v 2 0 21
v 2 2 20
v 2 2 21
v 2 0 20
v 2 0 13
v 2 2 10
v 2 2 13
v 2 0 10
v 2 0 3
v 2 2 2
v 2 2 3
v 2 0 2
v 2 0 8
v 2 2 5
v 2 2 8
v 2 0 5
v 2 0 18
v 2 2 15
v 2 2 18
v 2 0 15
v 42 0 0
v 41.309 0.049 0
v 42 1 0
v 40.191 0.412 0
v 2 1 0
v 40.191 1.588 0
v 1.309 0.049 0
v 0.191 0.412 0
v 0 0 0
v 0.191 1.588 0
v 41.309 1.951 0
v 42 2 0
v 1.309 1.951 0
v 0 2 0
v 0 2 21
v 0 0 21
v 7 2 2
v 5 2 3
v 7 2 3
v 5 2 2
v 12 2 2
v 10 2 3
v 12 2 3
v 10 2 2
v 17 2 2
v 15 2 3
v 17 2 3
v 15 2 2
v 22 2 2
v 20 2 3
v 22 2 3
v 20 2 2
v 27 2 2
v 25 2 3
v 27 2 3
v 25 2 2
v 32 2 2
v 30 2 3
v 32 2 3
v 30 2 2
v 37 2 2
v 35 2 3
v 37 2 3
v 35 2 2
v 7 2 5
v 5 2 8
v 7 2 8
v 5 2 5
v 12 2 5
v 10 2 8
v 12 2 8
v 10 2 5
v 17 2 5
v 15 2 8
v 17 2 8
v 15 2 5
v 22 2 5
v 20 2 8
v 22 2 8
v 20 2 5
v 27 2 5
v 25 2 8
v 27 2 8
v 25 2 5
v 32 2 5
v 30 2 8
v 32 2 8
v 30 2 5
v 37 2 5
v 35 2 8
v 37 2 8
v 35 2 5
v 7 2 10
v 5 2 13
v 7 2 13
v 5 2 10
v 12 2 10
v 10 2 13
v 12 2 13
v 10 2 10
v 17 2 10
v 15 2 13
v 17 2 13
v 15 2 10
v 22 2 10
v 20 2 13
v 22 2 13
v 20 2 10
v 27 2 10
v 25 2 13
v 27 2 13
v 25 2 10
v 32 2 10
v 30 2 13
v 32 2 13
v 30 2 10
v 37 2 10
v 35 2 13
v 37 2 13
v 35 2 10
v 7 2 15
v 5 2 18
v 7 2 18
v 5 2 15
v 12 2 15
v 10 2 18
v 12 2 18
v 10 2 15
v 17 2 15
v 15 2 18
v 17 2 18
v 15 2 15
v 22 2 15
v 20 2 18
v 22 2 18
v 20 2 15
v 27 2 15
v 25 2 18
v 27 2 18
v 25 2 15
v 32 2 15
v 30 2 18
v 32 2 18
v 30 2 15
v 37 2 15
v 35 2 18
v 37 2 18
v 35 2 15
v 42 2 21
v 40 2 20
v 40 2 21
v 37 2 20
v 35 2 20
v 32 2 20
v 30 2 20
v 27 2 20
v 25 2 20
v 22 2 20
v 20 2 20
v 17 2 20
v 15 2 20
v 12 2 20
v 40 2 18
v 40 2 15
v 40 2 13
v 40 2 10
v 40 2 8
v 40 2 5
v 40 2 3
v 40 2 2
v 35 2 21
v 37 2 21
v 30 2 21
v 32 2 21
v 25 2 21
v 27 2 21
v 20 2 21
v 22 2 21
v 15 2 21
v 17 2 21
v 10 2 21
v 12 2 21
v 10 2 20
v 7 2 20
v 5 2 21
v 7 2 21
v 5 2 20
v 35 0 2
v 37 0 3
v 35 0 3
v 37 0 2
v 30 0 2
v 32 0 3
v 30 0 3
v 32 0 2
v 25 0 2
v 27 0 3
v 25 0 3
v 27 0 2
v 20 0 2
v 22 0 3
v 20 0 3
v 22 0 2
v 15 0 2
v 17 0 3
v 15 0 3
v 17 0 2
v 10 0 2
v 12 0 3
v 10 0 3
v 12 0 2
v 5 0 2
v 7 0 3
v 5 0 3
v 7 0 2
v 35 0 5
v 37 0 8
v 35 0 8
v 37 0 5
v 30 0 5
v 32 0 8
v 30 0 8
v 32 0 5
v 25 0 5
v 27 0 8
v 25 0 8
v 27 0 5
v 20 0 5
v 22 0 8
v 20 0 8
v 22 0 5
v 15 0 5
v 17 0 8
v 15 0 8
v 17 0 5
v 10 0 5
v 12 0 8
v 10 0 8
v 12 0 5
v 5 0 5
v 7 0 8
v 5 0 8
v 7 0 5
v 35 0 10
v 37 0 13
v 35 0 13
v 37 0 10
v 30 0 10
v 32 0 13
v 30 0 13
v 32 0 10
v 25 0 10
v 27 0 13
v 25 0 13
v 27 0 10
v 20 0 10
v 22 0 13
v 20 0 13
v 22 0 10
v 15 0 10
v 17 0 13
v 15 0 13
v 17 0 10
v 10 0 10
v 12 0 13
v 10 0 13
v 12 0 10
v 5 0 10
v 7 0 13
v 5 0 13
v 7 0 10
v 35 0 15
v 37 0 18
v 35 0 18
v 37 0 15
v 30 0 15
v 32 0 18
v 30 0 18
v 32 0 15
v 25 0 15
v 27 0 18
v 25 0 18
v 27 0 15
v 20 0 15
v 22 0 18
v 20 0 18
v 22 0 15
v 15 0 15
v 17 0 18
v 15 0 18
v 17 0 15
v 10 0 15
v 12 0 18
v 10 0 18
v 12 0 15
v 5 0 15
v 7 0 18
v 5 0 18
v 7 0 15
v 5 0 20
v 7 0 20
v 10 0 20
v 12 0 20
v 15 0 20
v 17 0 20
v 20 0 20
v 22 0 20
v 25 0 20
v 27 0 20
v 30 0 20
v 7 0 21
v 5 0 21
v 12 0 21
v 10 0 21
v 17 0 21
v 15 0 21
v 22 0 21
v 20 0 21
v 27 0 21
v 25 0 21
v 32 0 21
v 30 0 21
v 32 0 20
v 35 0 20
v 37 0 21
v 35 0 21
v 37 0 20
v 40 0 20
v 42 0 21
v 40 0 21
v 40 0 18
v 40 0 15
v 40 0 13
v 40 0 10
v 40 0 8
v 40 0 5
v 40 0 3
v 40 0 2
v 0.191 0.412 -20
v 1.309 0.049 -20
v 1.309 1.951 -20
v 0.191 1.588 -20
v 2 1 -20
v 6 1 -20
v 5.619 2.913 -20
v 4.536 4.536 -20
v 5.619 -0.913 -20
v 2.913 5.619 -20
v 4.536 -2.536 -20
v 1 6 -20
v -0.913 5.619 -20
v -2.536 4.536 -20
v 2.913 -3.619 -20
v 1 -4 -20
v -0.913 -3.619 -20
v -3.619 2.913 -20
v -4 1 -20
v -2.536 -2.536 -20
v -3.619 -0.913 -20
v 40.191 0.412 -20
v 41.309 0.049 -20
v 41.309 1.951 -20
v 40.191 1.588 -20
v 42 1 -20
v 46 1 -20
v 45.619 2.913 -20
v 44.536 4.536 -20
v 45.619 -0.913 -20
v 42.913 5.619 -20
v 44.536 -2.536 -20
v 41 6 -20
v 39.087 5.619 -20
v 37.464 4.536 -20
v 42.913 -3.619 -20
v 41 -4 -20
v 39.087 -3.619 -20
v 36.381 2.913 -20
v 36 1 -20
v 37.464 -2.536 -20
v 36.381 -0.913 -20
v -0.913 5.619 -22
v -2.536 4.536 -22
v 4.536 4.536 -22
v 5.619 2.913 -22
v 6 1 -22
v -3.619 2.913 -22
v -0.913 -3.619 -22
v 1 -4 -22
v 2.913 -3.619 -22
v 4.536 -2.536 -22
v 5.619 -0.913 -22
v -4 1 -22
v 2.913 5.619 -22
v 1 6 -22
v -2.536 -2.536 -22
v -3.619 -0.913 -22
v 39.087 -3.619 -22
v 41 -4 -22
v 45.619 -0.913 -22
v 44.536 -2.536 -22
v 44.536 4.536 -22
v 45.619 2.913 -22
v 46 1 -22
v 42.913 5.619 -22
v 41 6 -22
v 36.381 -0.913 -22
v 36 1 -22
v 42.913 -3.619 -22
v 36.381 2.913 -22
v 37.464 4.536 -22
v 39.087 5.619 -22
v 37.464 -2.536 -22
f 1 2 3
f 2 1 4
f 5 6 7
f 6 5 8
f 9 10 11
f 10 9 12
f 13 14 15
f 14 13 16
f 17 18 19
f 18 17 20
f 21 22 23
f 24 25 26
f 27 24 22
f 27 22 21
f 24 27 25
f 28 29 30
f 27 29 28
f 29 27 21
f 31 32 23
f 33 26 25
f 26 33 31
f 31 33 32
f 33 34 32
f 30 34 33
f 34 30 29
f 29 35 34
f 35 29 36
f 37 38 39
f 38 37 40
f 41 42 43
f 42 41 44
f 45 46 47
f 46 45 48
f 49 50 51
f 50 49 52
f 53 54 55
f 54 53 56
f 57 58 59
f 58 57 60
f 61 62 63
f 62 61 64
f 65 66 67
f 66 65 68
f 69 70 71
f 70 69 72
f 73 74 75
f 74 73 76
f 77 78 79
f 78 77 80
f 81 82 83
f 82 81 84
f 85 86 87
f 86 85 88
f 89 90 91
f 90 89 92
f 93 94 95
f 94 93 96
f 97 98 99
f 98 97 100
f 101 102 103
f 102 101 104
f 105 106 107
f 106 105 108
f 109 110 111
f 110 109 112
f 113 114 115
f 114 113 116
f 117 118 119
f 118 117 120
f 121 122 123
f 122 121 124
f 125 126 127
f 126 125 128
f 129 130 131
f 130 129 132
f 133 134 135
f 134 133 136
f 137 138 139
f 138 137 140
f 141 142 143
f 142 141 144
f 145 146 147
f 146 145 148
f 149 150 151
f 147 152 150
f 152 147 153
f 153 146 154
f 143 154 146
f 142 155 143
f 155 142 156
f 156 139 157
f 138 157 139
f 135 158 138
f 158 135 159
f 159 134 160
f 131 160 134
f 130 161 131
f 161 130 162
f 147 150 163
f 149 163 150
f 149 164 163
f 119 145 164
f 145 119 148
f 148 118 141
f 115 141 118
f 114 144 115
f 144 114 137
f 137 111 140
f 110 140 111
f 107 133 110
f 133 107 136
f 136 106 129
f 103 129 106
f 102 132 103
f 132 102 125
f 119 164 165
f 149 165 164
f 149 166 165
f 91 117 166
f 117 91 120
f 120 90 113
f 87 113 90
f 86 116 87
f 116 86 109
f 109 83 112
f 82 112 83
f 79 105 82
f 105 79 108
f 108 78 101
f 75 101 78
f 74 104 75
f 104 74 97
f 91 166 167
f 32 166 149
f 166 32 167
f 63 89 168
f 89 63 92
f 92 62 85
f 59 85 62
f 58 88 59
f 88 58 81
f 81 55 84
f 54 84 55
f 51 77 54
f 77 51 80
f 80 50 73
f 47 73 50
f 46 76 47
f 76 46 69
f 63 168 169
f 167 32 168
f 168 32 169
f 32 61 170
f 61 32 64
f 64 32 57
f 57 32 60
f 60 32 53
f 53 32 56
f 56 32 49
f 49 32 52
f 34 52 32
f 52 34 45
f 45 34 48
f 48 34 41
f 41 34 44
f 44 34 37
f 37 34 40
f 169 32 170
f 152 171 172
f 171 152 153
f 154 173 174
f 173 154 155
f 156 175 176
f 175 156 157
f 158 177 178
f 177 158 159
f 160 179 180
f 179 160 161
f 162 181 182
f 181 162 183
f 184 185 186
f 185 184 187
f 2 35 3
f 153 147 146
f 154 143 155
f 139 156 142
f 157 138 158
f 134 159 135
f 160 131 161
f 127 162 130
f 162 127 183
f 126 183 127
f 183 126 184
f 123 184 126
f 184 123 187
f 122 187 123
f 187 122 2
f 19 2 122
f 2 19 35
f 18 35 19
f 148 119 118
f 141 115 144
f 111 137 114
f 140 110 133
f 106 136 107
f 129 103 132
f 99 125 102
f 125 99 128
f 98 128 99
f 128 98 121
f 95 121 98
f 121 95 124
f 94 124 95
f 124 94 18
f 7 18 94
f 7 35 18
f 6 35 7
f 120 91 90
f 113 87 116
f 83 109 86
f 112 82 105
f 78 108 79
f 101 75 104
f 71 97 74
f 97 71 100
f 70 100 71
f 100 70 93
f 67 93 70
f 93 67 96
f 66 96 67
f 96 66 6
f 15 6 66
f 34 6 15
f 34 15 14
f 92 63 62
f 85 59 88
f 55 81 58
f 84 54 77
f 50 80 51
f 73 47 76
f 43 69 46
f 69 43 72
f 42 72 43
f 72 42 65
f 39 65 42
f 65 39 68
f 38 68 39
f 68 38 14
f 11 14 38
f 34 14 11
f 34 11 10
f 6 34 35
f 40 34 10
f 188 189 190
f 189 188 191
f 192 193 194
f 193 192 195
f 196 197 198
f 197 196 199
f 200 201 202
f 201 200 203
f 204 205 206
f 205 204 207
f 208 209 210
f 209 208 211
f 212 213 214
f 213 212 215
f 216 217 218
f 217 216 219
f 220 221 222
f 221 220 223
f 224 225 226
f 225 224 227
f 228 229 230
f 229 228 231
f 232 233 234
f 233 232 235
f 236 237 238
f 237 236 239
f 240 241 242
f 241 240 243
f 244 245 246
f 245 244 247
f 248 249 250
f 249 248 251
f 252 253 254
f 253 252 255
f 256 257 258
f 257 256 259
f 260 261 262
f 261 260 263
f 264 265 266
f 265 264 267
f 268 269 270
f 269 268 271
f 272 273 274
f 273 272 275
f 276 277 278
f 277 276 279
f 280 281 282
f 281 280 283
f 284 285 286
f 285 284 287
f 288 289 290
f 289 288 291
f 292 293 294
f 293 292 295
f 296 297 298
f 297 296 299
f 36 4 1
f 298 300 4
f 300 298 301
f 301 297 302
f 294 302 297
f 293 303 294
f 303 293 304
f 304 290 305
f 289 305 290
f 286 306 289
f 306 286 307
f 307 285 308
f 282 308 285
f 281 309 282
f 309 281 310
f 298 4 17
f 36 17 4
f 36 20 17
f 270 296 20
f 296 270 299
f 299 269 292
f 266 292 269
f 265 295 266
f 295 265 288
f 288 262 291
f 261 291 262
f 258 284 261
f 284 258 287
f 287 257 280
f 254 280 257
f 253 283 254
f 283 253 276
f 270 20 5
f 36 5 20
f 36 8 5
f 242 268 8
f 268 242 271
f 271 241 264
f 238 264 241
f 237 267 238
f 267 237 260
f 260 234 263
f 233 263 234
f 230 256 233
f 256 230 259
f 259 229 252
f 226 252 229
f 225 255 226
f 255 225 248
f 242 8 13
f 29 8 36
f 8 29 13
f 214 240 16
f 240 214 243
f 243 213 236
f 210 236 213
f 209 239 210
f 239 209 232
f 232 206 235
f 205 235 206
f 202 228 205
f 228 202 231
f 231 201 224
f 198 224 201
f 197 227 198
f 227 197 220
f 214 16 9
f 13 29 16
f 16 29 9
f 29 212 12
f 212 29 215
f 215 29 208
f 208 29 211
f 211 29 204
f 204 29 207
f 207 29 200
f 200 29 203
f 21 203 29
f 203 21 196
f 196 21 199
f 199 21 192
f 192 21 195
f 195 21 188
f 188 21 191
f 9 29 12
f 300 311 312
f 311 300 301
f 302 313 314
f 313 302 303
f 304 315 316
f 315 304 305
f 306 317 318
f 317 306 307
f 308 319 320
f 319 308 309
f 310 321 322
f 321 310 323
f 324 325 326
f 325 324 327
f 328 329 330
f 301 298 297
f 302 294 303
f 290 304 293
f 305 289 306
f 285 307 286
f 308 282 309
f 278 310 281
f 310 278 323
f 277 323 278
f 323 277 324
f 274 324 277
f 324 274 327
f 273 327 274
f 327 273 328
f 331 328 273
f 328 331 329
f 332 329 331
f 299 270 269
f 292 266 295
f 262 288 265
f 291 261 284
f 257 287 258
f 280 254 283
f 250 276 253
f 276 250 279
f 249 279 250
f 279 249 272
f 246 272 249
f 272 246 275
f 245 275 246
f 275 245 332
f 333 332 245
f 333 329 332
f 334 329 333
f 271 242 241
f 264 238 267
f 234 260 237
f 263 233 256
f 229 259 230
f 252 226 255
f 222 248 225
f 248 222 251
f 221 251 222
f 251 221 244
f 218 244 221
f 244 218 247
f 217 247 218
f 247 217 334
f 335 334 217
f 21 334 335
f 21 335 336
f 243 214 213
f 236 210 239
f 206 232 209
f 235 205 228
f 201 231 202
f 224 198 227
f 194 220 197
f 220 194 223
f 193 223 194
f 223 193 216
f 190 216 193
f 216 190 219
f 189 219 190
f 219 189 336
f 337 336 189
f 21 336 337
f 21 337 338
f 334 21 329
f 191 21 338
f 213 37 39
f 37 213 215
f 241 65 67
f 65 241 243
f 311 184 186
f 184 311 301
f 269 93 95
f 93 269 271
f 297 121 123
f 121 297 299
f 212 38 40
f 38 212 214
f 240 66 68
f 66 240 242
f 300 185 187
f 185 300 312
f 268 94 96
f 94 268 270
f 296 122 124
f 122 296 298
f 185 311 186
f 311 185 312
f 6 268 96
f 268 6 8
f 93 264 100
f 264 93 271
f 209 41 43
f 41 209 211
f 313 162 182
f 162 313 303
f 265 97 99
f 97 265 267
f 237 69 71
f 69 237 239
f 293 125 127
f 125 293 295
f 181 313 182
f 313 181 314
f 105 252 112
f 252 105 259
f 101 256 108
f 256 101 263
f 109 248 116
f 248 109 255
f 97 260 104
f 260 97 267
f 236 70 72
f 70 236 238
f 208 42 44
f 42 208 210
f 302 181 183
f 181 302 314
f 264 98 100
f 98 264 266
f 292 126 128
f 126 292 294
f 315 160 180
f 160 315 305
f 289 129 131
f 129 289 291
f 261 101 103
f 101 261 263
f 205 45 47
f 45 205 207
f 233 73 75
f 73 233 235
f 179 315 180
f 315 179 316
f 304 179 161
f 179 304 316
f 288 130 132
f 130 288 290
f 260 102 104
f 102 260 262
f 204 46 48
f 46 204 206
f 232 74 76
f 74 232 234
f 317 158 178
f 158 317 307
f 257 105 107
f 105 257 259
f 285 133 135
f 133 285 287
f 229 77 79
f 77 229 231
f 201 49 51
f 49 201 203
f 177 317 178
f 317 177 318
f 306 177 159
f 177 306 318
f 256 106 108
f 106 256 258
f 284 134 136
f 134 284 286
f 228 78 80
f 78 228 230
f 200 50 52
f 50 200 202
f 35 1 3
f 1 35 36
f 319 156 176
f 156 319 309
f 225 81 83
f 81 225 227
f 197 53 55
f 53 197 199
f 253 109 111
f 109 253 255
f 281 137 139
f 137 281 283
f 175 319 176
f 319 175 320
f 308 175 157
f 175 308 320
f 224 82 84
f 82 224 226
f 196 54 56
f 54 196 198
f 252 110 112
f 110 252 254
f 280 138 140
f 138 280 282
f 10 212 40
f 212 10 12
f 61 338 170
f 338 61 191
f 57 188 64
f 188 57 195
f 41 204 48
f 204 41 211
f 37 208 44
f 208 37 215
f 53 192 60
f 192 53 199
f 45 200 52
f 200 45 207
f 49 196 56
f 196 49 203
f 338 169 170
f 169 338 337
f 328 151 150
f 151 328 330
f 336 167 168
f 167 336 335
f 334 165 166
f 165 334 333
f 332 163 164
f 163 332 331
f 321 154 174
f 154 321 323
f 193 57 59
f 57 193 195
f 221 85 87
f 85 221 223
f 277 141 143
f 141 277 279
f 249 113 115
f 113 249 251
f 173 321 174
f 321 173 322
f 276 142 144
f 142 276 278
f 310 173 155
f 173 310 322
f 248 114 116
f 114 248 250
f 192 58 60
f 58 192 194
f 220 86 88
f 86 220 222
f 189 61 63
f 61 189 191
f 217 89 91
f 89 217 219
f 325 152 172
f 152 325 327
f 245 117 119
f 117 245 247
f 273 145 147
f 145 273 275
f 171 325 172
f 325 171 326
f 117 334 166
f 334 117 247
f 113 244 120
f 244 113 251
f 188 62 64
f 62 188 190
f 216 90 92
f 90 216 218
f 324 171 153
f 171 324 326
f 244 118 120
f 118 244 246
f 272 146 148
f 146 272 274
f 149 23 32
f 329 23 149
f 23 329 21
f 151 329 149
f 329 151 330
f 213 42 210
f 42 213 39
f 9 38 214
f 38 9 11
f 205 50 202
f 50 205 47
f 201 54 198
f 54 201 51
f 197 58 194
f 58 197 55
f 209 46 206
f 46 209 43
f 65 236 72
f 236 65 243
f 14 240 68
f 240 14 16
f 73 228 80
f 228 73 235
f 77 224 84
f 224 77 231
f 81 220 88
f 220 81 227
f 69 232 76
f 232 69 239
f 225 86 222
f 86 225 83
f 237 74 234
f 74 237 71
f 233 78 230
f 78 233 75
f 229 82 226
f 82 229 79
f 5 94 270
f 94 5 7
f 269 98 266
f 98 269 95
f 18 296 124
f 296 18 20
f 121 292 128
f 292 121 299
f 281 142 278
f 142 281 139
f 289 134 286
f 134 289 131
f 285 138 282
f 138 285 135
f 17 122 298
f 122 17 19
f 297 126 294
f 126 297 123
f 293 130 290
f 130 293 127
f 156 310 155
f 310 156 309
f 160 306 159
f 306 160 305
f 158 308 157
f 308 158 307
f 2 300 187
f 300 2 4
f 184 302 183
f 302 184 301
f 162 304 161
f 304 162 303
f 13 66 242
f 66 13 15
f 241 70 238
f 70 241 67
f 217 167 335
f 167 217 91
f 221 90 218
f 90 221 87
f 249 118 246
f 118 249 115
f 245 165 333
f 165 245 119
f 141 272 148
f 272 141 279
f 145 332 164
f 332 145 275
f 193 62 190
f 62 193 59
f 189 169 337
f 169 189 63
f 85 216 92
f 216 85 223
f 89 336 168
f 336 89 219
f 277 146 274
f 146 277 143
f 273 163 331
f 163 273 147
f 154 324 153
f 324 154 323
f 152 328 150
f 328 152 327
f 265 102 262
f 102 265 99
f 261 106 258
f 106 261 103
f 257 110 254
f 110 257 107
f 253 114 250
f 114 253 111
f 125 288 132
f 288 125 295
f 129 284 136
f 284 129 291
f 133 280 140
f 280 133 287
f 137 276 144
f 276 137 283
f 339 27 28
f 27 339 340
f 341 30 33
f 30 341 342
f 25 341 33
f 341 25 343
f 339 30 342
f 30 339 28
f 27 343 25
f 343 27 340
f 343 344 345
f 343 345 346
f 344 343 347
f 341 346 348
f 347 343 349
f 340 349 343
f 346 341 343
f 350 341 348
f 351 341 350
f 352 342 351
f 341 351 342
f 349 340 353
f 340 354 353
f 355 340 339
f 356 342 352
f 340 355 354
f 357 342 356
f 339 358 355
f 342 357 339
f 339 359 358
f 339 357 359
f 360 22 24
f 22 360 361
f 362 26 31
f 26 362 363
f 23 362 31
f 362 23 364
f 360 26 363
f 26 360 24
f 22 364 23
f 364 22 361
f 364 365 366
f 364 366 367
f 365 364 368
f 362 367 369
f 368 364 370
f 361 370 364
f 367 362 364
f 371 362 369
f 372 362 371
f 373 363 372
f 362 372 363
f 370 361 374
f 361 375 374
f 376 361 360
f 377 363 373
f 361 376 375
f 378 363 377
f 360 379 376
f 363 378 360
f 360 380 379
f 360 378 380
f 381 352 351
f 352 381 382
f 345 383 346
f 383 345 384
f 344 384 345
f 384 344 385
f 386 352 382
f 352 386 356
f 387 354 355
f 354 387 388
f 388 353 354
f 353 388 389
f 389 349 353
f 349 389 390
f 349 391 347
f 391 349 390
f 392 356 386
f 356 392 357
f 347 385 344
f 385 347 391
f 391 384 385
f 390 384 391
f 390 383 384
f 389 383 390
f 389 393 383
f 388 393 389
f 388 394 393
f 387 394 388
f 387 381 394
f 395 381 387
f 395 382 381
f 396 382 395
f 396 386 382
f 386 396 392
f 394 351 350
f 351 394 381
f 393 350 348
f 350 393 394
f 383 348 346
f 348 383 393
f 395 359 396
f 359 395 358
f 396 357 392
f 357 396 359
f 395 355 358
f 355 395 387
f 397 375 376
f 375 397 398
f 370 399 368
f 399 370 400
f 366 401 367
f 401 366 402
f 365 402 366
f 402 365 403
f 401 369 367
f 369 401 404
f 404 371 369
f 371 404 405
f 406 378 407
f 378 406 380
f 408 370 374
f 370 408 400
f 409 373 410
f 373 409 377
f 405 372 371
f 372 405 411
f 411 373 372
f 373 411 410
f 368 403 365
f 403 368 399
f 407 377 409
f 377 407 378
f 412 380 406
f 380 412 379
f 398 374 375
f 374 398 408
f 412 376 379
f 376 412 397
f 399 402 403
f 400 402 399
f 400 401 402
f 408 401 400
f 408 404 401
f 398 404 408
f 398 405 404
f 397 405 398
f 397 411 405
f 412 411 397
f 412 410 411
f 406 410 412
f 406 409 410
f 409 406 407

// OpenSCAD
cube(size=[2,2,11]);

translate([5,0,0])
cube(size=[2,2,11]);

translate([5,0,10])
cube(size=[2,2,11]);

translate([10,0,10])
cube(size=[2,2,11]);

translate([15,0,10])
cube(size=[2,2,11]);

translate([20,0,10])
cube(size=[2,2,11]);

translate([0,0,10])
cube(size=[2,2,11]);

translate([25,0,10])
cube(size=[2,2,11]);

translate([40,0,0])
rotate([0,270,0])
cube(size=[2,2,38]);

translate([40,0,0])
rotate([0,270,0])
cube(size=[2,2,38]);

translate([30,0,10])
cube(size=[2,2,11]);

translate([35,0,10])
cube(size=[2,2,11]);

translate([40,0,10])
cube(size=[2,2,11]);

translate([10,0,0])
cube(size=[2,2,11]);

translate([15,0,0])
cube(size=[2,2,11]);

translate([20,0,0])
cube(size=[2,2,11]);

translate([25,0,0])
cube(size=[2,2,11]);

translate([30,0,0])
cube(size=[2,2,11]);

translate([35,0,0])
cube(size=[2,2,11]);

translate([40,0,0])
cube(size=[2,2,11]);

translate([5,0,5])
rotate([0,90,0])
cube(size=[2,2,11]);

translate([10,0,10])
rotate([0,90,0])
cube(size=[2,2,11]);

translate([20,0,10])
rotate([0,90,0])
cube(size=[2,2,11]);

translate([0,0,15])
rotate([0,90,0])
cube(size=[2,2,11]);

translate([0,0,20])
rotate([0,90,0])
cube(size=[2,2,11]);

translate([15,0,5])
rotate([0,90,0])
cube(size=[2,2,11]);

translate([0,0,10])
rotate([0,90,0])
cube(size=[2,2,11]);

translate([15,0,10])
rotate([0,90,0])
cube(size=[2,2,11]);

translate([0,0,5])
rotate([0,90,0])
cube(size=[2,2,11]);

translate([30,0,10])
rotate([0,90,0])
cube(size=[2,2,11]);

translate([30,0,15])
rotate([0,90,0])
cube(size=[2,2,11]);

translate([30,0,5])
rotate([0,90,0])
cube(size=[2,2,11]);

translate([30,0,20])
rotate([0,90,0])
cube(size=[2,2,11]);

translate([20,0,15])
rotate([0,90,0])
cube(size=[2,2,11]);

translate([20,0,20])
rotate([0,90,0])
cube(size=[2,2,11]);

translate([15,0,15])
rotate([0,90,0])
cube(size=[2,2,11]);

translate([15,0,20])
rotate([0,90,0])
cube(size=[2,2,11]);

translate([10,0,20])
rotate([0,90,0])
cube(size=[2,2,11]);

translate([10,0,15])
rotate([0,90,0])
cube(size=[2,2,11]);

translate([20,0,5])
rotate([0,90,0])
cube(size=[2,2,11]);

translate([1,1,-20])
cylinder(20);

translate([41,1,-20])
cylinder(20);

translate([1,1,-22])
cylinder(r1=5,r2=5,h=2);

translate([41,1,-22])
cylinder(r1=5,r2=5,h=2);
